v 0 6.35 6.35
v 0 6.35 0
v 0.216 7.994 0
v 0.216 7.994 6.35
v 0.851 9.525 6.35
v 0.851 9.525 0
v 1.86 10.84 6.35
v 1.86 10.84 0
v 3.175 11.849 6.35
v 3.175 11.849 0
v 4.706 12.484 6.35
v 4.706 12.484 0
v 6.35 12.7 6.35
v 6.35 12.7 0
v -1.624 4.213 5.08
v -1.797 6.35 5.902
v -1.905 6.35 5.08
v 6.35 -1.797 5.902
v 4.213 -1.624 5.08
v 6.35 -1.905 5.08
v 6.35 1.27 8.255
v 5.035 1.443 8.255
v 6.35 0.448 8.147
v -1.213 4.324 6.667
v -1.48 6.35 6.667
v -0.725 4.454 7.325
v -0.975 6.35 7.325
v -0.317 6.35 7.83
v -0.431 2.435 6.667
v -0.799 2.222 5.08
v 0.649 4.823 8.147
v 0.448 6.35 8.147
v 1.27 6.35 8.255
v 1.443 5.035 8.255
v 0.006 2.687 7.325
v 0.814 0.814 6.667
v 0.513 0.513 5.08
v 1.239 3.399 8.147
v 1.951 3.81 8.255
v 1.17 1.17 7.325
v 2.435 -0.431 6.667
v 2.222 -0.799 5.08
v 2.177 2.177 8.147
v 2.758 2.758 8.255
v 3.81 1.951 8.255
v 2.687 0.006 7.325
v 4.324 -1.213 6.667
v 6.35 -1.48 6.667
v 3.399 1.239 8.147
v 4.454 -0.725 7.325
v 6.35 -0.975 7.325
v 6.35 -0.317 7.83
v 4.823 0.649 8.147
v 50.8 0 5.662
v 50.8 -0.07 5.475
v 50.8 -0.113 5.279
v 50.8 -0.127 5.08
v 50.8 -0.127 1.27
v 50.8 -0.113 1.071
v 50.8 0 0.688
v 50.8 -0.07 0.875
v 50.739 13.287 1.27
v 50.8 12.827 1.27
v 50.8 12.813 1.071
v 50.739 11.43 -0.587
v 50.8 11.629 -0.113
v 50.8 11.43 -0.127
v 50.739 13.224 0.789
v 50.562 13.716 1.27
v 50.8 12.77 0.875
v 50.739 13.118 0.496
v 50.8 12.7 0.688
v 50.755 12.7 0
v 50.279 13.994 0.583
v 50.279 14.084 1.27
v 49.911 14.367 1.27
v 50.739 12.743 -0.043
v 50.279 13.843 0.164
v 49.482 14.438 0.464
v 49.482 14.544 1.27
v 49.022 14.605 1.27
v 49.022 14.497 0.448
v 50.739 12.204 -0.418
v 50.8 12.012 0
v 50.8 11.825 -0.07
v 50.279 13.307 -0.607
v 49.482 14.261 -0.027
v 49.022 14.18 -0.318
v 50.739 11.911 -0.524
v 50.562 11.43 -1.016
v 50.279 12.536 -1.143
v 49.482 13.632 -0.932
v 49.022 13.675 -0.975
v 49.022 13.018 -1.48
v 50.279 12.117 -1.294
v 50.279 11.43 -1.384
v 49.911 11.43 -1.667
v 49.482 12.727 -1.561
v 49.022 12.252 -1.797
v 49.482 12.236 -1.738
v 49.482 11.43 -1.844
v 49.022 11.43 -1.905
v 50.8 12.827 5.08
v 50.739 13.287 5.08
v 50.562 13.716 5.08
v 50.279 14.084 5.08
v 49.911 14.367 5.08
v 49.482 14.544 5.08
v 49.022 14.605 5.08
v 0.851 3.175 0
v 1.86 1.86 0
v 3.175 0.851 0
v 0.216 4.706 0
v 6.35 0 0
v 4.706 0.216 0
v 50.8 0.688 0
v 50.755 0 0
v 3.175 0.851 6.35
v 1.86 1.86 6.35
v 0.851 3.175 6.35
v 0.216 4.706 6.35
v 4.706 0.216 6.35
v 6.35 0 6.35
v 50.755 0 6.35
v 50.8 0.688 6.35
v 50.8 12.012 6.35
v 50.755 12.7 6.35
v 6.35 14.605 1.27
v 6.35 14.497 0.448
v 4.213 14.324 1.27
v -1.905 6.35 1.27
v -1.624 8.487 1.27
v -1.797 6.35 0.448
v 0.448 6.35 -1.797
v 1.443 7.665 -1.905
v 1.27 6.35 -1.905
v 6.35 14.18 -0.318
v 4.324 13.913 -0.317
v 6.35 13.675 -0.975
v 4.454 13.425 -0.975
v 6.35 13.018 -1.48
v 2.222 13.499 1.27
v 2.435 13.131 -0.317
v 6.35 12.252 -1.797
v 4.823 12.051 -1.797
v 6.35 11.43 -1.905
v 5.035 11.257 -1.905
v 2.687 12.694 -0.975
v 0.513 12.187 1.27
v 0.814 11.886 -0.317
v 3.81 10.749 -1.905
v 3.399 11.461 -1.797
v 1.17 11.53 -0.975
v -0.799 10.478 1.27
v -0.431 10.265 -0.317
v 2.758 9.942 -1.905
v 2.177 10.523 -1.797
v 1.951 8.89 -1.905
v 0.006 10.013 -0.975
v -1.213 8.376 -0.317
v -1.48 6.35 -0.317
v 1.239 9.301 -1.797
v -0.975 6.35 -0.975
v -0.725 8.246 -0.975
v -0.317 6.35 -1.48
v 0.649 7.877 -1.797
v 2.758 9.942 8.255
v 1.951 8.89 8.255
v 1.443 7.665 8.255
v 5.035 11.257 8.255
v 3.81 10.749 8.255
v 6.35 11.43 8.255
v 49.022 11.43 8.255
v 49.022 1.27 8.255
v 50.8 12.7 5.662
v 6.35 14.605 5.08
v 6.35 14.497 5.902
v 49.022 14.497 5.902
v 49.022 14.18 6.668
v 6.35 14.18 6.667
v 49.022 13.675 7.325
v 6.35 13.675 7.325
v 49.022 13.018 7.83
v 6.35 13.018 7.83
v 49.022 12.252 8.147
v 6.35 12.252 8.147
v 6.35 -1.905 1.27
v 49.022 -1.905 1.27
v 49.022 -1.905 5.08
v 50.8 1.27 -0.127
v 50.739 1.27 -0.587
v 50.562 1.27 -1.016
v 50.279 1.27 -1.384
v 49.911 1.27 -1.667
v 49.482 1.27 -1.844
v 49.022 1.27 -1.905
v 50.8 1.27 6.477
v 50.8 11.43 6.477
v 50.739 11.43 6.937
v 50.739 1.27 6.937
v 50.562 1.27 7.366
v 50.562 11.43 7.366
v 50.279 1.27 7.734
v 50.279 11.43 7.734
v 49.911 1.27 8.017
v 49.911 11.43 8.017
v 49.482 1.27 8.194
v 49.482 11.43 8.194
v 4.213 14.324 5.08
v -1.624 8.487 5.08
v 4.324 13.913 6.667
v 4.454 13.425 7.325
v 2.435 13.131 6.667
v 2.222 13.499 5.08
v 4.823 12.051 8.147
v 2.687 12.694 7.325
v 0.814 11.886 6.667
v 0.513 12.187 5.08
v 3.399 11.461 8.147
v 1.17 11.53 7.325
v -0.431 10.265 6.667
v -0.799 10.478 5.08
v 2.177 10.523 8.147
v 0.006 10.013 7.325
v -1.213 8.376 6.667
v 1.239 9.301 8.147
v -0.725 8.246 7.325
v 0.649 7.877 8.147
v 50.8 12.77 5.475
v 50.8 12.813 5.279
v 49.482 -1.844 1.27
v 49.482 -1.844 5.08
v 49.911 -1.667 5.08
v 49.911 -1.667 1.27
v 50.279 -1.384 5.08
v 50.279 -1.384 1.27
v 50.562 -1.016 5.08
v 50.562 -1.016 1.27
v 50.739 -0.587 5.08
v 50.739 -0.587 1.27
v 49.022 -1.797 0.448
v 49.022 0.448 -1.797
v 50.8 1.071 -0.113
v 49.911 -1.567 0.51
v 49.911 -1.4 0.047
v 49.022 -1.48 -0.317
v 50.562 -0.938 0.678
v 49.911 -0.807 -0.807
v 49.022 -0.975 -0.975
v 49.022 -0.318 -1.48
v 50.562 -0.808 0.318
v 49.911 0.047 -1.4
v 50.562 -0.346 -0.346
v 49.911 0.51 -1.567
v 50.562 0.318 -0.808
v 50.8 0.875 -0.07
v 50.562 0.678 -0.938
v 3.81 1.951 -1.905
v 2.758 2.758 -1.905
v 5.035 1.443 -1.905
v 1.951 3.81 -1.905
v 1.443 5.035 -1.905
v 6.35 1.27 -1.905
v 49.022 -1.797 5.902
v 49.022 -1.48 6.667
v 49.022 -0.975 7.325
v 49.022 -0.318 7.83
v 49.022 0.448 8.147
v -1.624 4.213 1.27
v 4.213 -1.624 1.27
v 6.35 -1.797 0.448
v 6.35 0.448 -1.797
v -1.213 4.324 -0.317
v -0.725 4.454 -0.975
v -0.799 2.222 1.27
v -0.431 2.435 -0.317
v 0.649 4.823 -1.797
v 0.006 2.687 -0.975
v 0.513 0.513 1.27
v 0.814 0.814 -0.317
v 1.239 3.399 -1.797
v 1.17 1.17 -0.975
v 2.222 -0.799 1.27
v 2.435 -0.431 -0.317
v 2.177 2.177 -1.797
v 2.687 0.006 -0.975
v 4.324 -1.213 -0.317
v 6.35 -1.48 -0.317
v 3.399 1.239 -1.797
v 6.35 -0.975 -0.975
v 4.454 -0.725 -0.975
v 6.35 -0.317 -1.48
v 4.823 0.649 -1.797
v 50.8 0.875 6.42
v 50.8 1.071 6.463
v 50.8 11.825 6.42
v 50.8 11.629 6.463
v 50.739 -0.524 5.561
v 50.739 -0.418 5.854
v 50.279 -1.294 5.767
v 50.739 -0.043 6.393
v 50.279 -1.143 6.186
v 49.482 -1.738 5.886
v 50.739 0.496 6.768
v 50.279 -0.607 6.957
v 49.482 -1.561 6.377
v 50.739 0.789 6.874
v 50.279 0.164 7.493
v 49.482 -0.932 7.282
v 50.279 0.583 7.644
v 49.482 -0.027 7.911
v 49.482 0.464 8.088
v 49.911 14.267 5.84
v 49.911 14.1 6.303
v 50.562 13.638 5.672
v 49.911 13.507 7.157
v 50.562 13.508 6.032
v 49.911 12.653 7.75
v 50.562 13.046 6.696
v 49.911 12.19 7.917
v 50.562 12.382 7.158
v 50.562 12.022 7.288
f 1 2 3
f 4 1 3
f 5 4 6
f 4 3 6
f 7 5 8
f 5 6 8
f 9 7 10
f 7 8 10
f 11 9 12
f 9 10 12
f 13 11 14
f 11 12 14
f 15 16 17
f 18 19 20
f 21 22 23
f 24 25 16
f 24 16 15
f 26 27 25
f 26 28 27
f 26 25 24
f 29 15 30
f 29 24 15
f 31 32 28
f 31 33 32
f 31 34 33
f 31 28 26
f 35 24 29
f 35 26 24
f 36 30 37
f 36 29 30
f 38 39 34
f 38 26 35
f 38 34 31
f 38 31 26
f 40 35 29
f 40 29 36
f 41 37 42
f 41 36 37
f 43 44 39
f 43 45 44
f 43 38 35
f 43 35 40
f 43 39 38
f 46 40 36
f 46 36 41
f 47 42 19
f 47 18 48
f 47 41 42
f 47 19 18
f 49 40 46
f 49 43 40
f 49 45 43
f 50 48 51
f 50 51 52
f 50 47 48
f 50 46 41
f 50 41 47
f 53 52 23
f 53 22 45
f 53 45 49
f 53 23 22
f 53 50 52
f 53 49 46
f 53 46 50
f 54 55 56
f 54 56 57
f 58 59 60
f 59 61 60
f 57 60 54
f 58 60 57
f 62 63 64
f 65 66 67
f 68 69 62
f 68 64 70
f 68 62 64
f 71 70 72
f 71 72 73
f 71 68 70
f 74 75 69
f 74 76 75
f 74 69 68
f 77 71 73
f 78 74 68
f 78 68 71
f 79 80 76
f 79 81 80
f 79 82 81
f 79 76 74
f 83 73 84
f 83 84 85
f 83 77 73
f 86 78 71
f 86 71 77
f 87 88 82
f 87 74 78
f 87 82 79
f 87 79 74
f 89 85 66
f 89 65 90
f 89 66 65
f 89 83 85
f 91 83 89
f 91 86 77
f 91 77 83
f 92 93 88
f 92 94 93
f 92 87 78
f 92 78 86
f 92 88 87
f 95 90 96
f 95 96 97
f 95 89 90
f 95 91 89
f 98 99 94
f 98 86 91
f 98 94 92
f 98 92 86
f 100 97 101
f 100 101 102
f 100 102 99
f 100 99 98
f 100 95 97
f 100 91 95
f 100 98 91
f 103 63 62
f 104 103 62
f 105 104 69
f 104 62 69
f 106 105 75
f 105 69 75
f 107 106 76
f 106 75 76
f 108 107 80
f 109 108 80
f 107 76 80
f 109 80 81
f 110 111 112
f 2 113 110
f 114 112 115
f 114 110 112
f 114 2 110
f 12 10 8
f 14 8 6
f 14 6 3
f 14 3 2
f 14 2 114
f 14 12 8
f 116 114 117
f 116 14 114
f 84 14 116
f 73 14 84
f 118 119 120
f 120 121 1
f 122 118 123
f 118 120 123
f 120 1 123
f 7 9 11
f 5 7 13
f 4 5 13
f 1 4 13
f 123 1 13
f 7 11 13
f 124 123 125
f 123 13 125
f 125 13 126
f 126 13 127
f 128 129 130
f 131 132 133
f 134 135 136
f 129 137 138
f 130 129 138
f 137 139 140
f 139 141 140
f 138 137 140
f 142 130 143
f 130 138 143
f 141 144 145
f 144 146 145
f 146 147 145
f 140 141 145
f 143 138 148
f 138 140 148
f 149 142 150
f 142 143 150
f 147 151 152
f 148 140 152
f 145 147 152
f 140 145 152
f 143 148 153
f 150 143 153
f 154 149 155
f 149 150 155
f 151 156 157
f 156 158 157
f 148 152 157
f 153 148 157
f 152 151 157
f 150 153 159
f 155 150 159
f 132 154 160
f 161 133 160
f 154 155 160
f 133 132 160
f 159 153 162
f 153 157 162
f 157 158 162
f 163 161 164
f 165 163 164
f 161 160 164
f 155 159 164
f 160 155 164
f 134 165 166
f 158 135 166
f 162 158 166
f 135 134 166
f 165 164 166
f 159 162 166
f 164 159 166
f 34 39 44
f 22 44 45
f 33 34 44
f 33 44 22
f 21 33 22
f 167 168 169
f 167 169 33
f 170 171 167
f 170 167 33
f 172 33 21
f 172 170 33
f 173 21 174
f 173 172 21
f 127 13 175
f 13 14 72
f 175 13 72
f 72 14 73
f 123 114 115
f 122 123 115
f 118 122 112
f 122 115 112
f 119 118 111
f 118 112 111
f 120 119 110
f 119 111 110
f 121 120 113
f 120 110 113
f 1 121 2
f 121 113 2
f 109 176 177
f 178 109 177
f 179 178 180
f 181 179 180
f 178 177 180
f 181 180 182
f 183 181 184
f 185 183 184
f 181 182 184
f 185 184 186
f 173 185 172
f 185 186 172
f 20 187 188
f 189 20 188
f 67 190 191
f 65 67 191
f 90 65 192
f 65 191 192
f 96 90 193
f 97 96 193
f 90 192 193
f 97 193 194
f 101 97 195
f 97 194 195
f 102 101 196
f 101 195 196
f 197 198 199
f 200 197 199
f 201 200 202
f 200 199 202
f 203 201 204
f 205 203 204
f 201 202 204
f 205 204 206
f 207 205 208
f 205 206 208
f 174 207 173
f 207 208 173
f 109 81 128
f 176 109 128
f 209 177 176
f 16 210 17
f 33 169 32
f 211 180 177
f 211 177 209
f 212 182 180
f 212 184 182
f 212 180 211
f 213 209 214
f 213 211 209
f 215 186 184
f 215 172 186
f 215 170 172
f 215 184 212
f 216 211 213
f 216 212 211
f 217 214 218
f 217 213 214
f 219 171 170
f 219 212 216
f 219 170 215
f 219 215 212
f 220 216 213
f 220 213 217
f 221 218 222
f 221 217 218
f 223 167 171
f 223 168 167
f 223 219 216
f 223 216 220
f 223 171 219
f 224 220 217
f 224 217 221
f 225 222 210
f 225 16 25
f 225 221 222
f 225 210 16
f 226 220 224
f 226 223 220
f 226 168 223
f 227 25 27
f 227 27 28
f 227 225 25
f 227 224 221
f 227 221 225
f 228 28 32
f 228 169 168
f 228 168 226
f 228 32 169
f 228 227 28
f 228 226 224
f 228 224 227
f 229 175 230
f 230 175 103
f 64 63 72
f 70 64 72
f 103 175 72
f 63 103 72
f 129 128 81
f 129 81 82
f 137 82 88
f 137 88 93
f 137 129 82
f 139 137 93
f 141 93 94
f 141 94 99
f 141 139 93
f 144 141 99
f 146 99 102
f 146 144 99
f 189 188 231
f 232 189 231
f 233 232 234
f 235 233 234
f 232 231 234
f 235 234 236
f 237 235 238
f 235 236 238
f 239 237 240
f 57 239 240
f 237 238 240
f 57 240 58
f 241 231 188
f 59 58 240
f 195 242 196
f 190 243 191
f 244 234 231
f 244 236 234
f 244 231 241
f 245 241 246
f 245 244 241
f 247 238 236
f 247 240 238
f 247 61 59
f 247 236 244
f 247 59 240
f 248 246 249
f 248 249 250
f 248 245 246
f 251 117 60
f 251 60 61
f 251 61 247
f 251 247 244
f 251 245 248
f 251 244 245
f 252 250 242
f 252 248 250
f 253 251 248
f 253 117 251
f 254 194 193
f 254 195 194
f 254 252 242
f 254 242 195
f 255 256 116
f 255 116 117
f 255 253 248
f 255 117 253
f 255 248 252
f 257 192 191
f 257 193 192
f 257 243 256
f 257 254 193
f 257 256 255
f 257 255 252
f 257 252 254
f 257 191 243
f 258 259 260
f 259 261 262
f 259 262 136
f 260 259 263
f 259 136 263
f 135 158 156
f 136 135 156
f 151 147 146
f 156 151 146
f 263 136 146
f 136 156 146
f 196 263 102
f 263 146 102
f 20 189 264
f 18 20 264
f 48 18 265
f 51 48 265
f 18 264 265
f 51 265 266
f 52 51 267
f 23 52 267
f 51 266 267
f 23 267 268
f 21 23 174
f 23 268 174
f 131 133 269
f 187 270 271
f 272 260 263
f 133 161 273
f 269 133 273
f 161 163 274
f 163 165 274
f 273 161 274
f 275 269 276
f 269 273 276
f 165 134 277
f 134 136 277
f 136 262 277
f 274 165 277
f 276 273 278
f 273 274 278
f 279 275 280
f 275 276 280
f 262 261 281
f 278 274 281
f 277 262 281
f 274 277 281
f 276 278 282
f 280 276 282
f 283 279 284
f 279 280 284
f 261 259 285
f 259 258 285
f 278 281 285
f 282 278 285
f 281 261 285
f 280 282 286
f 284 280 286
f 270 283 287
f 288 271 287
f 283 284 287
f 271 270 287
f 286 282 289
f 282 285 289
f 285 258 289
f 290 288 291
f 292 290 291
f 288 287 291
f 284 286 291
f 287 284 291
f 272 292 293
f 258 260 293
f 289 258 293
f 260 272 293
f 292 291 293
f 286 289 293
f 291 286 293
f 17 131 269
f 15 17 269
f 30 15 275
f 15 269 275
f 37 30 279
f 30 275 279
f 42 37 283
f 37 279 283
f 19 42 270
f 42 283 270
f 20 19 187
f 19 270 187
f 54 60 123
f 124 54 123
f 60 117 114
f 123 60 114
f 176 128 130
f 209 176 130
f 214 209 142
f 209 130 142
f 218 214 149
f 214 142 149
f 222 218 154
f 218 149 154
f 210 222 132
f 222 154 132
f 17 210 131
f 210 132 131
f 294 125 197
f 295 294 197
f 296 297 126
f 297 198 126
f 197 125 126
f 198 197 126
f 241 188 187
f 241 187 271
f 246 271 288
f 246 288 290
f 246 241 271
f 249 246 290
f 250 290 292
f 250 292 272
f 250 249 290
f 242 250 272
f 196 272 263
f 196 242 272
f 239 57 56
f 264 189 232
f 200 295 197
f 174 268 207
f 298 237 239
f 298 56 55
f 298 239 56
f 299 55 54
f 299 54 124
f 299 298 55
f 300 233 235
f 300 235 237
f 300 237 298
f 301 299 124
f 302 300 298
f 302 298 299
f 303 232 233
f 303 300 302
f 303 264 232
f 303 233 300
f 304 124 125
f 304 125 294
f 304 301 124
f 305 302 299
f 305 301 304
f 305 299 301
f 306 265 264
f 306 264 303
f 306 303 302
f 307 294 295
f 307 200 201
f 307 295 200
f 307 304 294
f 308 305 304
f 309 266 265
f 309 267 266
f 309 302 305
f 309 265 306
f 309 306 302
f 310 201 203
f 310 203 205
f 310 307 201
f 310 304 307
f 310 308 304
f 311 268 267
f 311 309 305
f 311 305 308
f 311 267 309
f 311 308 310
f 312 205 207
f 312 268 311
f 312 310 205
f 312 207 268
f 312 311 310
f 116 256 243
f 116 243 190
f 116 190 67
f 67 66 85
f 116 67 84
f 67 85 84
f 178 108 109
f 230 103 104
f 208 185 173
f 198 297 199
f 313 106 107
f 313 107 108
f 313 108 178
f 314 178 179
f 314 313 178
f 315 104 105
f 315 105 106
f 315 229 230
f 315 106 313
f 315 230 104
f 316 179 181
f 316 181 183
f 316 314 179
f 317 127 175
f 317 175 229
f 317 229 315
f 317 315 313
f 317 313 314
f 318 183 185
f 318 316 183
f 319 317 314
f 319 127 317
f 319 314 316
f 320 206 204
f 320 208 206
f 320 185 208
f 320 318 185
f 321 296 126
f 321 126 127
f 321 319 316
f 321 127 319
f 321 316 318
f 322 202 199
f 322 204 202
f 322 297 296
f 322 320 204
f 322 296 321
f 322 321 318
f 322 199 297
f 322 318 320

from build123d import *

# Parameters (mm, degrees)
SKETCH1_W          = 50.8
SKETCH1_H          = 12.7
BASE_EXTRUDE_DEPTH = 6.35
FILLET1_R          = 6.35
SHELL1_DEPTH       = 6.35
SHELL1_START       = -1.905
SHELL1_2_DEPTH     = 10.16
SHELL1_3_DEPTH     = 1.905
SHELL1_START_2     = 6.35
SHELL1_4_DEPTH     = 1.905
FILLET3_R          = 3.175
FILLET4_R          = 1.778


# Read off the part's stored shape, not the designer's step: Shell1
# Some blends are built 0.0001 mm under size
with BuildPart() as part:
    # Sketch1 → Base-Extrude (new body)
    with BuildSketch(Plane.XY):
        with Locations((25.4, 6.35)):
            Rectangle(SKETCH1_W, SKETCH1_H)
    extrude(amount=BASE_EXTRUDE_DEPTH)

    # Fillet1
    fillet1_edges = [part.edges().sort_by_distance(p)[0] for p in [
        (0, 0, 3.175),
        (0, 12.7, 3.175),
    ]]
    fillet(fillet1_edges, radius=FILLET1_R - 0.0001)  # a hair under: the kernel refuses the full size

    # Shell1 outline → Shell1 (cut)
    with BuildSketch(Plane.XY):
        with BuildLine():
            Line((6.35, 0), (50.8, 0))
            Line((50.8, 0), (50.8, 12.7))
            Line((50.8, 12.7), (6.35, 12.7))
            ThreePointArc((6.35, 12.7), (1.859871939, 10.840128061), (0, 6.35))
            ThreePointArc((0, 6.35), (1.859871939, 1.859871939), (6.35, 0))
        make_face()
    extrude(amount=SHELL1_DEPTH, mode=Mode.SUBTRACT)

    # Shell1 2 outline → Shell1 2 (add)
    with BuildSketch(Plane.XY.offset(SHELL1_START)):
        with BuildLine():
            Line((6.35, -1.905), (50.8, -1.905))
            Line((50.8, -1.905), (50.8, 0))
            Line((50.8, 0), (6.35, 0))
            ThreePointArc((6.35, 0), (1.859871939, 1.859871939), (0, 6.35))
            ThreePointArc((0, 6.35), (1.859871939, 10.840128061), (6.35, 12.7))
            Line((6.35, 12.7), (50.8, 12.7))
            Line((50.8, 12.7), (50.8, 14.605))
            Line((50.8, 14.605), (6.35, 14.605))
            ThreePointArc((6.35, 14.605), (0.512833521, 12.187166479), (-1.905, 6.35))
            ThreePointArc((-1.905, 6.35), (0.512833521, 0.512833521), (6.35, -1.905))
        make_face()
    extrude(amount=SHELL1_2_DEPTH)

    # Shell1 3 outline → Shell1 3 (add)
    with BuildSketch(Plane.XY.offset(SHELL1_START)):
        with BuildLine():
            Line((6.35, 0), (50.8, 0))
            Line((50.8, 0), (50.8, 12.7))
            Line((50.8, 12.7), (6.35, 12.7))
            ThreePointArc((6.35, 12.7), (1.859871939, 10.840128061), (0, 6.35))
            ThreePointArc((0, 6.35), (1.859871939, 1.859871939), (6.35, 0))
        make_face()
    extrude(amount=SHELL1_3_DEPTH)

    # Shell1 4 outline → Shell1 4 (add)
    with BuildSketch(Plane.XY.offset(SHELL1_START_2)):
        with BuildLine():
            Line((6.35, 0), (50.8, 0))
            Line((50.8, 0), (50.8, 12.7))
            Line((50.8, 12.7), (6.35, 12.7))
            ThreePointArc((6.35, 12.7), (1.859871939, 10.840128061), (0, 6.35))
            ThreePointArc((0, 6.35), (1.859871939, 1.859871939), (6.35, 0))
        make_face()
    extrude(amount=SHELL1_4_DEPTH)

    # Fillet3
    fillet3_edges = [part.edges().sort_by_distance(p)[0] for p in [
        (28.575, -1.905, -1.905),
        (0.512833521, 0.512833521, -1.905),
        (0.512833521, 12.187166479, -1.905),
        (28.575, -1.905, 8.255),
        (0.512833521, 0.512833521, 8.255),
        (0.512833521, 12.187166479, 8.255),
        (28.575, 14.605, -1.905),
        (28.575, 14.605, 8.255),
    ]]
    fillet(fillet3_edges, radius=FILLET3_R)

    # Fillet4
    # the kernel refuses this fillet: 1.778 mm, written as the material it takes off along each edge
    with BuildSketch(Plane(origin=(50.8, -1.905, 1.27), x_dir=(0, 1, 0), z_dir=(0, 0, 1))) as fillet4_piece_1:
        with BuildLine():
            CenterArc((FILLET4_R, FILLET4_R), FILLET4_R, 180, 90)
            Line((0, FILLET4_R), (0, 0))
            Line((0, 0), (FILLET4_R, 0))
        make_face()
    extrude(amount=3.81, mode=Mode.SUBTRACT)
    with BuildSketch(Plane(origin=(50.8, 1.27, -1.905), x_dir=(0, 0, 1), z_dir=(0, 1, 0)), Plane(origin=(50.8, 11.43, 8.255), x_dir=(0, 0, -1), z_dir=(0, -1, 0))) as fillet4_piece_2:
        with BuildLine():
            CenterArc((FILLET4_R, -FILLET4_R), FILLET4_R, 90, 90)
            Line((0, -FILLET4_R), (0, 0))
            Line((0, 0), (FILLET4_R, 0))
        make_face()
    extrude(amount=10.16, mode=Mode.SUBTRACT)
    with BuildSketch(Plane(origin=(50.8, 14.605, 1.27), x_dir=(0, -1, 0), z_dir=(0, 0, 1))) as fillet4_piece_3:
        with BuildLine():
            CenterArc((FILLET4_R, -FILLET4_R), FILLET4_R, 90, 90)
            Line((0, -FILLET4_R), (0, 0))
            Line((0, 0), (FILLET4_R, 0))
        make_face()
    extrude(amount=3.81, mode=Mode.SUBTRACT)
    with BuildSketch(Plane(origin=(50.8, 11.43, 5.08), x_dir=(0, 1, 0), z_dir=(0, 0, -1))) as fillet4_piece_4:
        with BuildLine():
            CenterArc((3.175 - FILLET4_R, -FILLET4_R), FILLET4_R, 0, 90)
            Line((3.175, -FILLET4_R), (3.175, 0))
            Line((3.175, 0), (3.175 - FILLET4_R, 0))
        make_face()
    revolve(axis=Axis((50.8, 11.43, 5.08), (1, 0, 0)), revolution_arc=90, mode=Mode.SUBTRACT)
    with BuildSketch(Plane(origin=(50.8, 11.43, 1.27), x_dir=(0, 1, 0), z_dir=(0, 0, 1))) as fillet4_piece_5:
        with BuildLine():
            CenterArc((3.175 - FILLET4_R, FILLET4_R), FILLET4_R, 270, 90)
            Line((3.175, FILLET4_R), (3.175, 0))
            Line((3.175, 0), (3.175 - FILLET4_R, 0))
        make_face()
    revolve(axis=Axis((50.8, 11.43, 1.27), (-1, 0, 0)), revolution_arc=90, mode=Mode.SUBTRACT)
    with BuildSketch(Plane(origin=(50.8, 1.27, 5.08), x_dir=(0, -1, 0), z_dir=(0, 0, -1))) as fillet4_piece_6:
        with BuildLine():
            CenterArc((3.175 - FILLET4_R, FILLET4_R), FILLET4_R, 270, 90)
            Line((3.175, FILLET4_R), (3.175, 0))
            Line((3.175, 0), (3.175 - FILLET4_R, 0))
        make_face()
    revolve(axis=Axis((50.8, 1.27, 5.08), (-1, 0, 0)), revolution_arc=90, mode=Mode.SUBTRACT)
    with BuildSketch(Plane(origin=(50.8, 1.27, 1.27), x_dir=(0, -1, 0), z_dir=(0, 0, 1))) as fillet4_piece_7:
        with BuildLine():
            CenterArc((3.175 - FILLET4_R, -FILLET4_R), FILLET4_R, 0, 90)
            Line((3.175, -FILLET4_R), (3.175, 0))
            Line((3.175, 0), (3.175 - FILLET4_R, 0))
        make_face()
    revolve(axis=Axis((50.8, 1.27, 1.27), (1, 0, 0)), revolution_arc=90, mode=Mode.SUBTRACT)


solid = part.part
